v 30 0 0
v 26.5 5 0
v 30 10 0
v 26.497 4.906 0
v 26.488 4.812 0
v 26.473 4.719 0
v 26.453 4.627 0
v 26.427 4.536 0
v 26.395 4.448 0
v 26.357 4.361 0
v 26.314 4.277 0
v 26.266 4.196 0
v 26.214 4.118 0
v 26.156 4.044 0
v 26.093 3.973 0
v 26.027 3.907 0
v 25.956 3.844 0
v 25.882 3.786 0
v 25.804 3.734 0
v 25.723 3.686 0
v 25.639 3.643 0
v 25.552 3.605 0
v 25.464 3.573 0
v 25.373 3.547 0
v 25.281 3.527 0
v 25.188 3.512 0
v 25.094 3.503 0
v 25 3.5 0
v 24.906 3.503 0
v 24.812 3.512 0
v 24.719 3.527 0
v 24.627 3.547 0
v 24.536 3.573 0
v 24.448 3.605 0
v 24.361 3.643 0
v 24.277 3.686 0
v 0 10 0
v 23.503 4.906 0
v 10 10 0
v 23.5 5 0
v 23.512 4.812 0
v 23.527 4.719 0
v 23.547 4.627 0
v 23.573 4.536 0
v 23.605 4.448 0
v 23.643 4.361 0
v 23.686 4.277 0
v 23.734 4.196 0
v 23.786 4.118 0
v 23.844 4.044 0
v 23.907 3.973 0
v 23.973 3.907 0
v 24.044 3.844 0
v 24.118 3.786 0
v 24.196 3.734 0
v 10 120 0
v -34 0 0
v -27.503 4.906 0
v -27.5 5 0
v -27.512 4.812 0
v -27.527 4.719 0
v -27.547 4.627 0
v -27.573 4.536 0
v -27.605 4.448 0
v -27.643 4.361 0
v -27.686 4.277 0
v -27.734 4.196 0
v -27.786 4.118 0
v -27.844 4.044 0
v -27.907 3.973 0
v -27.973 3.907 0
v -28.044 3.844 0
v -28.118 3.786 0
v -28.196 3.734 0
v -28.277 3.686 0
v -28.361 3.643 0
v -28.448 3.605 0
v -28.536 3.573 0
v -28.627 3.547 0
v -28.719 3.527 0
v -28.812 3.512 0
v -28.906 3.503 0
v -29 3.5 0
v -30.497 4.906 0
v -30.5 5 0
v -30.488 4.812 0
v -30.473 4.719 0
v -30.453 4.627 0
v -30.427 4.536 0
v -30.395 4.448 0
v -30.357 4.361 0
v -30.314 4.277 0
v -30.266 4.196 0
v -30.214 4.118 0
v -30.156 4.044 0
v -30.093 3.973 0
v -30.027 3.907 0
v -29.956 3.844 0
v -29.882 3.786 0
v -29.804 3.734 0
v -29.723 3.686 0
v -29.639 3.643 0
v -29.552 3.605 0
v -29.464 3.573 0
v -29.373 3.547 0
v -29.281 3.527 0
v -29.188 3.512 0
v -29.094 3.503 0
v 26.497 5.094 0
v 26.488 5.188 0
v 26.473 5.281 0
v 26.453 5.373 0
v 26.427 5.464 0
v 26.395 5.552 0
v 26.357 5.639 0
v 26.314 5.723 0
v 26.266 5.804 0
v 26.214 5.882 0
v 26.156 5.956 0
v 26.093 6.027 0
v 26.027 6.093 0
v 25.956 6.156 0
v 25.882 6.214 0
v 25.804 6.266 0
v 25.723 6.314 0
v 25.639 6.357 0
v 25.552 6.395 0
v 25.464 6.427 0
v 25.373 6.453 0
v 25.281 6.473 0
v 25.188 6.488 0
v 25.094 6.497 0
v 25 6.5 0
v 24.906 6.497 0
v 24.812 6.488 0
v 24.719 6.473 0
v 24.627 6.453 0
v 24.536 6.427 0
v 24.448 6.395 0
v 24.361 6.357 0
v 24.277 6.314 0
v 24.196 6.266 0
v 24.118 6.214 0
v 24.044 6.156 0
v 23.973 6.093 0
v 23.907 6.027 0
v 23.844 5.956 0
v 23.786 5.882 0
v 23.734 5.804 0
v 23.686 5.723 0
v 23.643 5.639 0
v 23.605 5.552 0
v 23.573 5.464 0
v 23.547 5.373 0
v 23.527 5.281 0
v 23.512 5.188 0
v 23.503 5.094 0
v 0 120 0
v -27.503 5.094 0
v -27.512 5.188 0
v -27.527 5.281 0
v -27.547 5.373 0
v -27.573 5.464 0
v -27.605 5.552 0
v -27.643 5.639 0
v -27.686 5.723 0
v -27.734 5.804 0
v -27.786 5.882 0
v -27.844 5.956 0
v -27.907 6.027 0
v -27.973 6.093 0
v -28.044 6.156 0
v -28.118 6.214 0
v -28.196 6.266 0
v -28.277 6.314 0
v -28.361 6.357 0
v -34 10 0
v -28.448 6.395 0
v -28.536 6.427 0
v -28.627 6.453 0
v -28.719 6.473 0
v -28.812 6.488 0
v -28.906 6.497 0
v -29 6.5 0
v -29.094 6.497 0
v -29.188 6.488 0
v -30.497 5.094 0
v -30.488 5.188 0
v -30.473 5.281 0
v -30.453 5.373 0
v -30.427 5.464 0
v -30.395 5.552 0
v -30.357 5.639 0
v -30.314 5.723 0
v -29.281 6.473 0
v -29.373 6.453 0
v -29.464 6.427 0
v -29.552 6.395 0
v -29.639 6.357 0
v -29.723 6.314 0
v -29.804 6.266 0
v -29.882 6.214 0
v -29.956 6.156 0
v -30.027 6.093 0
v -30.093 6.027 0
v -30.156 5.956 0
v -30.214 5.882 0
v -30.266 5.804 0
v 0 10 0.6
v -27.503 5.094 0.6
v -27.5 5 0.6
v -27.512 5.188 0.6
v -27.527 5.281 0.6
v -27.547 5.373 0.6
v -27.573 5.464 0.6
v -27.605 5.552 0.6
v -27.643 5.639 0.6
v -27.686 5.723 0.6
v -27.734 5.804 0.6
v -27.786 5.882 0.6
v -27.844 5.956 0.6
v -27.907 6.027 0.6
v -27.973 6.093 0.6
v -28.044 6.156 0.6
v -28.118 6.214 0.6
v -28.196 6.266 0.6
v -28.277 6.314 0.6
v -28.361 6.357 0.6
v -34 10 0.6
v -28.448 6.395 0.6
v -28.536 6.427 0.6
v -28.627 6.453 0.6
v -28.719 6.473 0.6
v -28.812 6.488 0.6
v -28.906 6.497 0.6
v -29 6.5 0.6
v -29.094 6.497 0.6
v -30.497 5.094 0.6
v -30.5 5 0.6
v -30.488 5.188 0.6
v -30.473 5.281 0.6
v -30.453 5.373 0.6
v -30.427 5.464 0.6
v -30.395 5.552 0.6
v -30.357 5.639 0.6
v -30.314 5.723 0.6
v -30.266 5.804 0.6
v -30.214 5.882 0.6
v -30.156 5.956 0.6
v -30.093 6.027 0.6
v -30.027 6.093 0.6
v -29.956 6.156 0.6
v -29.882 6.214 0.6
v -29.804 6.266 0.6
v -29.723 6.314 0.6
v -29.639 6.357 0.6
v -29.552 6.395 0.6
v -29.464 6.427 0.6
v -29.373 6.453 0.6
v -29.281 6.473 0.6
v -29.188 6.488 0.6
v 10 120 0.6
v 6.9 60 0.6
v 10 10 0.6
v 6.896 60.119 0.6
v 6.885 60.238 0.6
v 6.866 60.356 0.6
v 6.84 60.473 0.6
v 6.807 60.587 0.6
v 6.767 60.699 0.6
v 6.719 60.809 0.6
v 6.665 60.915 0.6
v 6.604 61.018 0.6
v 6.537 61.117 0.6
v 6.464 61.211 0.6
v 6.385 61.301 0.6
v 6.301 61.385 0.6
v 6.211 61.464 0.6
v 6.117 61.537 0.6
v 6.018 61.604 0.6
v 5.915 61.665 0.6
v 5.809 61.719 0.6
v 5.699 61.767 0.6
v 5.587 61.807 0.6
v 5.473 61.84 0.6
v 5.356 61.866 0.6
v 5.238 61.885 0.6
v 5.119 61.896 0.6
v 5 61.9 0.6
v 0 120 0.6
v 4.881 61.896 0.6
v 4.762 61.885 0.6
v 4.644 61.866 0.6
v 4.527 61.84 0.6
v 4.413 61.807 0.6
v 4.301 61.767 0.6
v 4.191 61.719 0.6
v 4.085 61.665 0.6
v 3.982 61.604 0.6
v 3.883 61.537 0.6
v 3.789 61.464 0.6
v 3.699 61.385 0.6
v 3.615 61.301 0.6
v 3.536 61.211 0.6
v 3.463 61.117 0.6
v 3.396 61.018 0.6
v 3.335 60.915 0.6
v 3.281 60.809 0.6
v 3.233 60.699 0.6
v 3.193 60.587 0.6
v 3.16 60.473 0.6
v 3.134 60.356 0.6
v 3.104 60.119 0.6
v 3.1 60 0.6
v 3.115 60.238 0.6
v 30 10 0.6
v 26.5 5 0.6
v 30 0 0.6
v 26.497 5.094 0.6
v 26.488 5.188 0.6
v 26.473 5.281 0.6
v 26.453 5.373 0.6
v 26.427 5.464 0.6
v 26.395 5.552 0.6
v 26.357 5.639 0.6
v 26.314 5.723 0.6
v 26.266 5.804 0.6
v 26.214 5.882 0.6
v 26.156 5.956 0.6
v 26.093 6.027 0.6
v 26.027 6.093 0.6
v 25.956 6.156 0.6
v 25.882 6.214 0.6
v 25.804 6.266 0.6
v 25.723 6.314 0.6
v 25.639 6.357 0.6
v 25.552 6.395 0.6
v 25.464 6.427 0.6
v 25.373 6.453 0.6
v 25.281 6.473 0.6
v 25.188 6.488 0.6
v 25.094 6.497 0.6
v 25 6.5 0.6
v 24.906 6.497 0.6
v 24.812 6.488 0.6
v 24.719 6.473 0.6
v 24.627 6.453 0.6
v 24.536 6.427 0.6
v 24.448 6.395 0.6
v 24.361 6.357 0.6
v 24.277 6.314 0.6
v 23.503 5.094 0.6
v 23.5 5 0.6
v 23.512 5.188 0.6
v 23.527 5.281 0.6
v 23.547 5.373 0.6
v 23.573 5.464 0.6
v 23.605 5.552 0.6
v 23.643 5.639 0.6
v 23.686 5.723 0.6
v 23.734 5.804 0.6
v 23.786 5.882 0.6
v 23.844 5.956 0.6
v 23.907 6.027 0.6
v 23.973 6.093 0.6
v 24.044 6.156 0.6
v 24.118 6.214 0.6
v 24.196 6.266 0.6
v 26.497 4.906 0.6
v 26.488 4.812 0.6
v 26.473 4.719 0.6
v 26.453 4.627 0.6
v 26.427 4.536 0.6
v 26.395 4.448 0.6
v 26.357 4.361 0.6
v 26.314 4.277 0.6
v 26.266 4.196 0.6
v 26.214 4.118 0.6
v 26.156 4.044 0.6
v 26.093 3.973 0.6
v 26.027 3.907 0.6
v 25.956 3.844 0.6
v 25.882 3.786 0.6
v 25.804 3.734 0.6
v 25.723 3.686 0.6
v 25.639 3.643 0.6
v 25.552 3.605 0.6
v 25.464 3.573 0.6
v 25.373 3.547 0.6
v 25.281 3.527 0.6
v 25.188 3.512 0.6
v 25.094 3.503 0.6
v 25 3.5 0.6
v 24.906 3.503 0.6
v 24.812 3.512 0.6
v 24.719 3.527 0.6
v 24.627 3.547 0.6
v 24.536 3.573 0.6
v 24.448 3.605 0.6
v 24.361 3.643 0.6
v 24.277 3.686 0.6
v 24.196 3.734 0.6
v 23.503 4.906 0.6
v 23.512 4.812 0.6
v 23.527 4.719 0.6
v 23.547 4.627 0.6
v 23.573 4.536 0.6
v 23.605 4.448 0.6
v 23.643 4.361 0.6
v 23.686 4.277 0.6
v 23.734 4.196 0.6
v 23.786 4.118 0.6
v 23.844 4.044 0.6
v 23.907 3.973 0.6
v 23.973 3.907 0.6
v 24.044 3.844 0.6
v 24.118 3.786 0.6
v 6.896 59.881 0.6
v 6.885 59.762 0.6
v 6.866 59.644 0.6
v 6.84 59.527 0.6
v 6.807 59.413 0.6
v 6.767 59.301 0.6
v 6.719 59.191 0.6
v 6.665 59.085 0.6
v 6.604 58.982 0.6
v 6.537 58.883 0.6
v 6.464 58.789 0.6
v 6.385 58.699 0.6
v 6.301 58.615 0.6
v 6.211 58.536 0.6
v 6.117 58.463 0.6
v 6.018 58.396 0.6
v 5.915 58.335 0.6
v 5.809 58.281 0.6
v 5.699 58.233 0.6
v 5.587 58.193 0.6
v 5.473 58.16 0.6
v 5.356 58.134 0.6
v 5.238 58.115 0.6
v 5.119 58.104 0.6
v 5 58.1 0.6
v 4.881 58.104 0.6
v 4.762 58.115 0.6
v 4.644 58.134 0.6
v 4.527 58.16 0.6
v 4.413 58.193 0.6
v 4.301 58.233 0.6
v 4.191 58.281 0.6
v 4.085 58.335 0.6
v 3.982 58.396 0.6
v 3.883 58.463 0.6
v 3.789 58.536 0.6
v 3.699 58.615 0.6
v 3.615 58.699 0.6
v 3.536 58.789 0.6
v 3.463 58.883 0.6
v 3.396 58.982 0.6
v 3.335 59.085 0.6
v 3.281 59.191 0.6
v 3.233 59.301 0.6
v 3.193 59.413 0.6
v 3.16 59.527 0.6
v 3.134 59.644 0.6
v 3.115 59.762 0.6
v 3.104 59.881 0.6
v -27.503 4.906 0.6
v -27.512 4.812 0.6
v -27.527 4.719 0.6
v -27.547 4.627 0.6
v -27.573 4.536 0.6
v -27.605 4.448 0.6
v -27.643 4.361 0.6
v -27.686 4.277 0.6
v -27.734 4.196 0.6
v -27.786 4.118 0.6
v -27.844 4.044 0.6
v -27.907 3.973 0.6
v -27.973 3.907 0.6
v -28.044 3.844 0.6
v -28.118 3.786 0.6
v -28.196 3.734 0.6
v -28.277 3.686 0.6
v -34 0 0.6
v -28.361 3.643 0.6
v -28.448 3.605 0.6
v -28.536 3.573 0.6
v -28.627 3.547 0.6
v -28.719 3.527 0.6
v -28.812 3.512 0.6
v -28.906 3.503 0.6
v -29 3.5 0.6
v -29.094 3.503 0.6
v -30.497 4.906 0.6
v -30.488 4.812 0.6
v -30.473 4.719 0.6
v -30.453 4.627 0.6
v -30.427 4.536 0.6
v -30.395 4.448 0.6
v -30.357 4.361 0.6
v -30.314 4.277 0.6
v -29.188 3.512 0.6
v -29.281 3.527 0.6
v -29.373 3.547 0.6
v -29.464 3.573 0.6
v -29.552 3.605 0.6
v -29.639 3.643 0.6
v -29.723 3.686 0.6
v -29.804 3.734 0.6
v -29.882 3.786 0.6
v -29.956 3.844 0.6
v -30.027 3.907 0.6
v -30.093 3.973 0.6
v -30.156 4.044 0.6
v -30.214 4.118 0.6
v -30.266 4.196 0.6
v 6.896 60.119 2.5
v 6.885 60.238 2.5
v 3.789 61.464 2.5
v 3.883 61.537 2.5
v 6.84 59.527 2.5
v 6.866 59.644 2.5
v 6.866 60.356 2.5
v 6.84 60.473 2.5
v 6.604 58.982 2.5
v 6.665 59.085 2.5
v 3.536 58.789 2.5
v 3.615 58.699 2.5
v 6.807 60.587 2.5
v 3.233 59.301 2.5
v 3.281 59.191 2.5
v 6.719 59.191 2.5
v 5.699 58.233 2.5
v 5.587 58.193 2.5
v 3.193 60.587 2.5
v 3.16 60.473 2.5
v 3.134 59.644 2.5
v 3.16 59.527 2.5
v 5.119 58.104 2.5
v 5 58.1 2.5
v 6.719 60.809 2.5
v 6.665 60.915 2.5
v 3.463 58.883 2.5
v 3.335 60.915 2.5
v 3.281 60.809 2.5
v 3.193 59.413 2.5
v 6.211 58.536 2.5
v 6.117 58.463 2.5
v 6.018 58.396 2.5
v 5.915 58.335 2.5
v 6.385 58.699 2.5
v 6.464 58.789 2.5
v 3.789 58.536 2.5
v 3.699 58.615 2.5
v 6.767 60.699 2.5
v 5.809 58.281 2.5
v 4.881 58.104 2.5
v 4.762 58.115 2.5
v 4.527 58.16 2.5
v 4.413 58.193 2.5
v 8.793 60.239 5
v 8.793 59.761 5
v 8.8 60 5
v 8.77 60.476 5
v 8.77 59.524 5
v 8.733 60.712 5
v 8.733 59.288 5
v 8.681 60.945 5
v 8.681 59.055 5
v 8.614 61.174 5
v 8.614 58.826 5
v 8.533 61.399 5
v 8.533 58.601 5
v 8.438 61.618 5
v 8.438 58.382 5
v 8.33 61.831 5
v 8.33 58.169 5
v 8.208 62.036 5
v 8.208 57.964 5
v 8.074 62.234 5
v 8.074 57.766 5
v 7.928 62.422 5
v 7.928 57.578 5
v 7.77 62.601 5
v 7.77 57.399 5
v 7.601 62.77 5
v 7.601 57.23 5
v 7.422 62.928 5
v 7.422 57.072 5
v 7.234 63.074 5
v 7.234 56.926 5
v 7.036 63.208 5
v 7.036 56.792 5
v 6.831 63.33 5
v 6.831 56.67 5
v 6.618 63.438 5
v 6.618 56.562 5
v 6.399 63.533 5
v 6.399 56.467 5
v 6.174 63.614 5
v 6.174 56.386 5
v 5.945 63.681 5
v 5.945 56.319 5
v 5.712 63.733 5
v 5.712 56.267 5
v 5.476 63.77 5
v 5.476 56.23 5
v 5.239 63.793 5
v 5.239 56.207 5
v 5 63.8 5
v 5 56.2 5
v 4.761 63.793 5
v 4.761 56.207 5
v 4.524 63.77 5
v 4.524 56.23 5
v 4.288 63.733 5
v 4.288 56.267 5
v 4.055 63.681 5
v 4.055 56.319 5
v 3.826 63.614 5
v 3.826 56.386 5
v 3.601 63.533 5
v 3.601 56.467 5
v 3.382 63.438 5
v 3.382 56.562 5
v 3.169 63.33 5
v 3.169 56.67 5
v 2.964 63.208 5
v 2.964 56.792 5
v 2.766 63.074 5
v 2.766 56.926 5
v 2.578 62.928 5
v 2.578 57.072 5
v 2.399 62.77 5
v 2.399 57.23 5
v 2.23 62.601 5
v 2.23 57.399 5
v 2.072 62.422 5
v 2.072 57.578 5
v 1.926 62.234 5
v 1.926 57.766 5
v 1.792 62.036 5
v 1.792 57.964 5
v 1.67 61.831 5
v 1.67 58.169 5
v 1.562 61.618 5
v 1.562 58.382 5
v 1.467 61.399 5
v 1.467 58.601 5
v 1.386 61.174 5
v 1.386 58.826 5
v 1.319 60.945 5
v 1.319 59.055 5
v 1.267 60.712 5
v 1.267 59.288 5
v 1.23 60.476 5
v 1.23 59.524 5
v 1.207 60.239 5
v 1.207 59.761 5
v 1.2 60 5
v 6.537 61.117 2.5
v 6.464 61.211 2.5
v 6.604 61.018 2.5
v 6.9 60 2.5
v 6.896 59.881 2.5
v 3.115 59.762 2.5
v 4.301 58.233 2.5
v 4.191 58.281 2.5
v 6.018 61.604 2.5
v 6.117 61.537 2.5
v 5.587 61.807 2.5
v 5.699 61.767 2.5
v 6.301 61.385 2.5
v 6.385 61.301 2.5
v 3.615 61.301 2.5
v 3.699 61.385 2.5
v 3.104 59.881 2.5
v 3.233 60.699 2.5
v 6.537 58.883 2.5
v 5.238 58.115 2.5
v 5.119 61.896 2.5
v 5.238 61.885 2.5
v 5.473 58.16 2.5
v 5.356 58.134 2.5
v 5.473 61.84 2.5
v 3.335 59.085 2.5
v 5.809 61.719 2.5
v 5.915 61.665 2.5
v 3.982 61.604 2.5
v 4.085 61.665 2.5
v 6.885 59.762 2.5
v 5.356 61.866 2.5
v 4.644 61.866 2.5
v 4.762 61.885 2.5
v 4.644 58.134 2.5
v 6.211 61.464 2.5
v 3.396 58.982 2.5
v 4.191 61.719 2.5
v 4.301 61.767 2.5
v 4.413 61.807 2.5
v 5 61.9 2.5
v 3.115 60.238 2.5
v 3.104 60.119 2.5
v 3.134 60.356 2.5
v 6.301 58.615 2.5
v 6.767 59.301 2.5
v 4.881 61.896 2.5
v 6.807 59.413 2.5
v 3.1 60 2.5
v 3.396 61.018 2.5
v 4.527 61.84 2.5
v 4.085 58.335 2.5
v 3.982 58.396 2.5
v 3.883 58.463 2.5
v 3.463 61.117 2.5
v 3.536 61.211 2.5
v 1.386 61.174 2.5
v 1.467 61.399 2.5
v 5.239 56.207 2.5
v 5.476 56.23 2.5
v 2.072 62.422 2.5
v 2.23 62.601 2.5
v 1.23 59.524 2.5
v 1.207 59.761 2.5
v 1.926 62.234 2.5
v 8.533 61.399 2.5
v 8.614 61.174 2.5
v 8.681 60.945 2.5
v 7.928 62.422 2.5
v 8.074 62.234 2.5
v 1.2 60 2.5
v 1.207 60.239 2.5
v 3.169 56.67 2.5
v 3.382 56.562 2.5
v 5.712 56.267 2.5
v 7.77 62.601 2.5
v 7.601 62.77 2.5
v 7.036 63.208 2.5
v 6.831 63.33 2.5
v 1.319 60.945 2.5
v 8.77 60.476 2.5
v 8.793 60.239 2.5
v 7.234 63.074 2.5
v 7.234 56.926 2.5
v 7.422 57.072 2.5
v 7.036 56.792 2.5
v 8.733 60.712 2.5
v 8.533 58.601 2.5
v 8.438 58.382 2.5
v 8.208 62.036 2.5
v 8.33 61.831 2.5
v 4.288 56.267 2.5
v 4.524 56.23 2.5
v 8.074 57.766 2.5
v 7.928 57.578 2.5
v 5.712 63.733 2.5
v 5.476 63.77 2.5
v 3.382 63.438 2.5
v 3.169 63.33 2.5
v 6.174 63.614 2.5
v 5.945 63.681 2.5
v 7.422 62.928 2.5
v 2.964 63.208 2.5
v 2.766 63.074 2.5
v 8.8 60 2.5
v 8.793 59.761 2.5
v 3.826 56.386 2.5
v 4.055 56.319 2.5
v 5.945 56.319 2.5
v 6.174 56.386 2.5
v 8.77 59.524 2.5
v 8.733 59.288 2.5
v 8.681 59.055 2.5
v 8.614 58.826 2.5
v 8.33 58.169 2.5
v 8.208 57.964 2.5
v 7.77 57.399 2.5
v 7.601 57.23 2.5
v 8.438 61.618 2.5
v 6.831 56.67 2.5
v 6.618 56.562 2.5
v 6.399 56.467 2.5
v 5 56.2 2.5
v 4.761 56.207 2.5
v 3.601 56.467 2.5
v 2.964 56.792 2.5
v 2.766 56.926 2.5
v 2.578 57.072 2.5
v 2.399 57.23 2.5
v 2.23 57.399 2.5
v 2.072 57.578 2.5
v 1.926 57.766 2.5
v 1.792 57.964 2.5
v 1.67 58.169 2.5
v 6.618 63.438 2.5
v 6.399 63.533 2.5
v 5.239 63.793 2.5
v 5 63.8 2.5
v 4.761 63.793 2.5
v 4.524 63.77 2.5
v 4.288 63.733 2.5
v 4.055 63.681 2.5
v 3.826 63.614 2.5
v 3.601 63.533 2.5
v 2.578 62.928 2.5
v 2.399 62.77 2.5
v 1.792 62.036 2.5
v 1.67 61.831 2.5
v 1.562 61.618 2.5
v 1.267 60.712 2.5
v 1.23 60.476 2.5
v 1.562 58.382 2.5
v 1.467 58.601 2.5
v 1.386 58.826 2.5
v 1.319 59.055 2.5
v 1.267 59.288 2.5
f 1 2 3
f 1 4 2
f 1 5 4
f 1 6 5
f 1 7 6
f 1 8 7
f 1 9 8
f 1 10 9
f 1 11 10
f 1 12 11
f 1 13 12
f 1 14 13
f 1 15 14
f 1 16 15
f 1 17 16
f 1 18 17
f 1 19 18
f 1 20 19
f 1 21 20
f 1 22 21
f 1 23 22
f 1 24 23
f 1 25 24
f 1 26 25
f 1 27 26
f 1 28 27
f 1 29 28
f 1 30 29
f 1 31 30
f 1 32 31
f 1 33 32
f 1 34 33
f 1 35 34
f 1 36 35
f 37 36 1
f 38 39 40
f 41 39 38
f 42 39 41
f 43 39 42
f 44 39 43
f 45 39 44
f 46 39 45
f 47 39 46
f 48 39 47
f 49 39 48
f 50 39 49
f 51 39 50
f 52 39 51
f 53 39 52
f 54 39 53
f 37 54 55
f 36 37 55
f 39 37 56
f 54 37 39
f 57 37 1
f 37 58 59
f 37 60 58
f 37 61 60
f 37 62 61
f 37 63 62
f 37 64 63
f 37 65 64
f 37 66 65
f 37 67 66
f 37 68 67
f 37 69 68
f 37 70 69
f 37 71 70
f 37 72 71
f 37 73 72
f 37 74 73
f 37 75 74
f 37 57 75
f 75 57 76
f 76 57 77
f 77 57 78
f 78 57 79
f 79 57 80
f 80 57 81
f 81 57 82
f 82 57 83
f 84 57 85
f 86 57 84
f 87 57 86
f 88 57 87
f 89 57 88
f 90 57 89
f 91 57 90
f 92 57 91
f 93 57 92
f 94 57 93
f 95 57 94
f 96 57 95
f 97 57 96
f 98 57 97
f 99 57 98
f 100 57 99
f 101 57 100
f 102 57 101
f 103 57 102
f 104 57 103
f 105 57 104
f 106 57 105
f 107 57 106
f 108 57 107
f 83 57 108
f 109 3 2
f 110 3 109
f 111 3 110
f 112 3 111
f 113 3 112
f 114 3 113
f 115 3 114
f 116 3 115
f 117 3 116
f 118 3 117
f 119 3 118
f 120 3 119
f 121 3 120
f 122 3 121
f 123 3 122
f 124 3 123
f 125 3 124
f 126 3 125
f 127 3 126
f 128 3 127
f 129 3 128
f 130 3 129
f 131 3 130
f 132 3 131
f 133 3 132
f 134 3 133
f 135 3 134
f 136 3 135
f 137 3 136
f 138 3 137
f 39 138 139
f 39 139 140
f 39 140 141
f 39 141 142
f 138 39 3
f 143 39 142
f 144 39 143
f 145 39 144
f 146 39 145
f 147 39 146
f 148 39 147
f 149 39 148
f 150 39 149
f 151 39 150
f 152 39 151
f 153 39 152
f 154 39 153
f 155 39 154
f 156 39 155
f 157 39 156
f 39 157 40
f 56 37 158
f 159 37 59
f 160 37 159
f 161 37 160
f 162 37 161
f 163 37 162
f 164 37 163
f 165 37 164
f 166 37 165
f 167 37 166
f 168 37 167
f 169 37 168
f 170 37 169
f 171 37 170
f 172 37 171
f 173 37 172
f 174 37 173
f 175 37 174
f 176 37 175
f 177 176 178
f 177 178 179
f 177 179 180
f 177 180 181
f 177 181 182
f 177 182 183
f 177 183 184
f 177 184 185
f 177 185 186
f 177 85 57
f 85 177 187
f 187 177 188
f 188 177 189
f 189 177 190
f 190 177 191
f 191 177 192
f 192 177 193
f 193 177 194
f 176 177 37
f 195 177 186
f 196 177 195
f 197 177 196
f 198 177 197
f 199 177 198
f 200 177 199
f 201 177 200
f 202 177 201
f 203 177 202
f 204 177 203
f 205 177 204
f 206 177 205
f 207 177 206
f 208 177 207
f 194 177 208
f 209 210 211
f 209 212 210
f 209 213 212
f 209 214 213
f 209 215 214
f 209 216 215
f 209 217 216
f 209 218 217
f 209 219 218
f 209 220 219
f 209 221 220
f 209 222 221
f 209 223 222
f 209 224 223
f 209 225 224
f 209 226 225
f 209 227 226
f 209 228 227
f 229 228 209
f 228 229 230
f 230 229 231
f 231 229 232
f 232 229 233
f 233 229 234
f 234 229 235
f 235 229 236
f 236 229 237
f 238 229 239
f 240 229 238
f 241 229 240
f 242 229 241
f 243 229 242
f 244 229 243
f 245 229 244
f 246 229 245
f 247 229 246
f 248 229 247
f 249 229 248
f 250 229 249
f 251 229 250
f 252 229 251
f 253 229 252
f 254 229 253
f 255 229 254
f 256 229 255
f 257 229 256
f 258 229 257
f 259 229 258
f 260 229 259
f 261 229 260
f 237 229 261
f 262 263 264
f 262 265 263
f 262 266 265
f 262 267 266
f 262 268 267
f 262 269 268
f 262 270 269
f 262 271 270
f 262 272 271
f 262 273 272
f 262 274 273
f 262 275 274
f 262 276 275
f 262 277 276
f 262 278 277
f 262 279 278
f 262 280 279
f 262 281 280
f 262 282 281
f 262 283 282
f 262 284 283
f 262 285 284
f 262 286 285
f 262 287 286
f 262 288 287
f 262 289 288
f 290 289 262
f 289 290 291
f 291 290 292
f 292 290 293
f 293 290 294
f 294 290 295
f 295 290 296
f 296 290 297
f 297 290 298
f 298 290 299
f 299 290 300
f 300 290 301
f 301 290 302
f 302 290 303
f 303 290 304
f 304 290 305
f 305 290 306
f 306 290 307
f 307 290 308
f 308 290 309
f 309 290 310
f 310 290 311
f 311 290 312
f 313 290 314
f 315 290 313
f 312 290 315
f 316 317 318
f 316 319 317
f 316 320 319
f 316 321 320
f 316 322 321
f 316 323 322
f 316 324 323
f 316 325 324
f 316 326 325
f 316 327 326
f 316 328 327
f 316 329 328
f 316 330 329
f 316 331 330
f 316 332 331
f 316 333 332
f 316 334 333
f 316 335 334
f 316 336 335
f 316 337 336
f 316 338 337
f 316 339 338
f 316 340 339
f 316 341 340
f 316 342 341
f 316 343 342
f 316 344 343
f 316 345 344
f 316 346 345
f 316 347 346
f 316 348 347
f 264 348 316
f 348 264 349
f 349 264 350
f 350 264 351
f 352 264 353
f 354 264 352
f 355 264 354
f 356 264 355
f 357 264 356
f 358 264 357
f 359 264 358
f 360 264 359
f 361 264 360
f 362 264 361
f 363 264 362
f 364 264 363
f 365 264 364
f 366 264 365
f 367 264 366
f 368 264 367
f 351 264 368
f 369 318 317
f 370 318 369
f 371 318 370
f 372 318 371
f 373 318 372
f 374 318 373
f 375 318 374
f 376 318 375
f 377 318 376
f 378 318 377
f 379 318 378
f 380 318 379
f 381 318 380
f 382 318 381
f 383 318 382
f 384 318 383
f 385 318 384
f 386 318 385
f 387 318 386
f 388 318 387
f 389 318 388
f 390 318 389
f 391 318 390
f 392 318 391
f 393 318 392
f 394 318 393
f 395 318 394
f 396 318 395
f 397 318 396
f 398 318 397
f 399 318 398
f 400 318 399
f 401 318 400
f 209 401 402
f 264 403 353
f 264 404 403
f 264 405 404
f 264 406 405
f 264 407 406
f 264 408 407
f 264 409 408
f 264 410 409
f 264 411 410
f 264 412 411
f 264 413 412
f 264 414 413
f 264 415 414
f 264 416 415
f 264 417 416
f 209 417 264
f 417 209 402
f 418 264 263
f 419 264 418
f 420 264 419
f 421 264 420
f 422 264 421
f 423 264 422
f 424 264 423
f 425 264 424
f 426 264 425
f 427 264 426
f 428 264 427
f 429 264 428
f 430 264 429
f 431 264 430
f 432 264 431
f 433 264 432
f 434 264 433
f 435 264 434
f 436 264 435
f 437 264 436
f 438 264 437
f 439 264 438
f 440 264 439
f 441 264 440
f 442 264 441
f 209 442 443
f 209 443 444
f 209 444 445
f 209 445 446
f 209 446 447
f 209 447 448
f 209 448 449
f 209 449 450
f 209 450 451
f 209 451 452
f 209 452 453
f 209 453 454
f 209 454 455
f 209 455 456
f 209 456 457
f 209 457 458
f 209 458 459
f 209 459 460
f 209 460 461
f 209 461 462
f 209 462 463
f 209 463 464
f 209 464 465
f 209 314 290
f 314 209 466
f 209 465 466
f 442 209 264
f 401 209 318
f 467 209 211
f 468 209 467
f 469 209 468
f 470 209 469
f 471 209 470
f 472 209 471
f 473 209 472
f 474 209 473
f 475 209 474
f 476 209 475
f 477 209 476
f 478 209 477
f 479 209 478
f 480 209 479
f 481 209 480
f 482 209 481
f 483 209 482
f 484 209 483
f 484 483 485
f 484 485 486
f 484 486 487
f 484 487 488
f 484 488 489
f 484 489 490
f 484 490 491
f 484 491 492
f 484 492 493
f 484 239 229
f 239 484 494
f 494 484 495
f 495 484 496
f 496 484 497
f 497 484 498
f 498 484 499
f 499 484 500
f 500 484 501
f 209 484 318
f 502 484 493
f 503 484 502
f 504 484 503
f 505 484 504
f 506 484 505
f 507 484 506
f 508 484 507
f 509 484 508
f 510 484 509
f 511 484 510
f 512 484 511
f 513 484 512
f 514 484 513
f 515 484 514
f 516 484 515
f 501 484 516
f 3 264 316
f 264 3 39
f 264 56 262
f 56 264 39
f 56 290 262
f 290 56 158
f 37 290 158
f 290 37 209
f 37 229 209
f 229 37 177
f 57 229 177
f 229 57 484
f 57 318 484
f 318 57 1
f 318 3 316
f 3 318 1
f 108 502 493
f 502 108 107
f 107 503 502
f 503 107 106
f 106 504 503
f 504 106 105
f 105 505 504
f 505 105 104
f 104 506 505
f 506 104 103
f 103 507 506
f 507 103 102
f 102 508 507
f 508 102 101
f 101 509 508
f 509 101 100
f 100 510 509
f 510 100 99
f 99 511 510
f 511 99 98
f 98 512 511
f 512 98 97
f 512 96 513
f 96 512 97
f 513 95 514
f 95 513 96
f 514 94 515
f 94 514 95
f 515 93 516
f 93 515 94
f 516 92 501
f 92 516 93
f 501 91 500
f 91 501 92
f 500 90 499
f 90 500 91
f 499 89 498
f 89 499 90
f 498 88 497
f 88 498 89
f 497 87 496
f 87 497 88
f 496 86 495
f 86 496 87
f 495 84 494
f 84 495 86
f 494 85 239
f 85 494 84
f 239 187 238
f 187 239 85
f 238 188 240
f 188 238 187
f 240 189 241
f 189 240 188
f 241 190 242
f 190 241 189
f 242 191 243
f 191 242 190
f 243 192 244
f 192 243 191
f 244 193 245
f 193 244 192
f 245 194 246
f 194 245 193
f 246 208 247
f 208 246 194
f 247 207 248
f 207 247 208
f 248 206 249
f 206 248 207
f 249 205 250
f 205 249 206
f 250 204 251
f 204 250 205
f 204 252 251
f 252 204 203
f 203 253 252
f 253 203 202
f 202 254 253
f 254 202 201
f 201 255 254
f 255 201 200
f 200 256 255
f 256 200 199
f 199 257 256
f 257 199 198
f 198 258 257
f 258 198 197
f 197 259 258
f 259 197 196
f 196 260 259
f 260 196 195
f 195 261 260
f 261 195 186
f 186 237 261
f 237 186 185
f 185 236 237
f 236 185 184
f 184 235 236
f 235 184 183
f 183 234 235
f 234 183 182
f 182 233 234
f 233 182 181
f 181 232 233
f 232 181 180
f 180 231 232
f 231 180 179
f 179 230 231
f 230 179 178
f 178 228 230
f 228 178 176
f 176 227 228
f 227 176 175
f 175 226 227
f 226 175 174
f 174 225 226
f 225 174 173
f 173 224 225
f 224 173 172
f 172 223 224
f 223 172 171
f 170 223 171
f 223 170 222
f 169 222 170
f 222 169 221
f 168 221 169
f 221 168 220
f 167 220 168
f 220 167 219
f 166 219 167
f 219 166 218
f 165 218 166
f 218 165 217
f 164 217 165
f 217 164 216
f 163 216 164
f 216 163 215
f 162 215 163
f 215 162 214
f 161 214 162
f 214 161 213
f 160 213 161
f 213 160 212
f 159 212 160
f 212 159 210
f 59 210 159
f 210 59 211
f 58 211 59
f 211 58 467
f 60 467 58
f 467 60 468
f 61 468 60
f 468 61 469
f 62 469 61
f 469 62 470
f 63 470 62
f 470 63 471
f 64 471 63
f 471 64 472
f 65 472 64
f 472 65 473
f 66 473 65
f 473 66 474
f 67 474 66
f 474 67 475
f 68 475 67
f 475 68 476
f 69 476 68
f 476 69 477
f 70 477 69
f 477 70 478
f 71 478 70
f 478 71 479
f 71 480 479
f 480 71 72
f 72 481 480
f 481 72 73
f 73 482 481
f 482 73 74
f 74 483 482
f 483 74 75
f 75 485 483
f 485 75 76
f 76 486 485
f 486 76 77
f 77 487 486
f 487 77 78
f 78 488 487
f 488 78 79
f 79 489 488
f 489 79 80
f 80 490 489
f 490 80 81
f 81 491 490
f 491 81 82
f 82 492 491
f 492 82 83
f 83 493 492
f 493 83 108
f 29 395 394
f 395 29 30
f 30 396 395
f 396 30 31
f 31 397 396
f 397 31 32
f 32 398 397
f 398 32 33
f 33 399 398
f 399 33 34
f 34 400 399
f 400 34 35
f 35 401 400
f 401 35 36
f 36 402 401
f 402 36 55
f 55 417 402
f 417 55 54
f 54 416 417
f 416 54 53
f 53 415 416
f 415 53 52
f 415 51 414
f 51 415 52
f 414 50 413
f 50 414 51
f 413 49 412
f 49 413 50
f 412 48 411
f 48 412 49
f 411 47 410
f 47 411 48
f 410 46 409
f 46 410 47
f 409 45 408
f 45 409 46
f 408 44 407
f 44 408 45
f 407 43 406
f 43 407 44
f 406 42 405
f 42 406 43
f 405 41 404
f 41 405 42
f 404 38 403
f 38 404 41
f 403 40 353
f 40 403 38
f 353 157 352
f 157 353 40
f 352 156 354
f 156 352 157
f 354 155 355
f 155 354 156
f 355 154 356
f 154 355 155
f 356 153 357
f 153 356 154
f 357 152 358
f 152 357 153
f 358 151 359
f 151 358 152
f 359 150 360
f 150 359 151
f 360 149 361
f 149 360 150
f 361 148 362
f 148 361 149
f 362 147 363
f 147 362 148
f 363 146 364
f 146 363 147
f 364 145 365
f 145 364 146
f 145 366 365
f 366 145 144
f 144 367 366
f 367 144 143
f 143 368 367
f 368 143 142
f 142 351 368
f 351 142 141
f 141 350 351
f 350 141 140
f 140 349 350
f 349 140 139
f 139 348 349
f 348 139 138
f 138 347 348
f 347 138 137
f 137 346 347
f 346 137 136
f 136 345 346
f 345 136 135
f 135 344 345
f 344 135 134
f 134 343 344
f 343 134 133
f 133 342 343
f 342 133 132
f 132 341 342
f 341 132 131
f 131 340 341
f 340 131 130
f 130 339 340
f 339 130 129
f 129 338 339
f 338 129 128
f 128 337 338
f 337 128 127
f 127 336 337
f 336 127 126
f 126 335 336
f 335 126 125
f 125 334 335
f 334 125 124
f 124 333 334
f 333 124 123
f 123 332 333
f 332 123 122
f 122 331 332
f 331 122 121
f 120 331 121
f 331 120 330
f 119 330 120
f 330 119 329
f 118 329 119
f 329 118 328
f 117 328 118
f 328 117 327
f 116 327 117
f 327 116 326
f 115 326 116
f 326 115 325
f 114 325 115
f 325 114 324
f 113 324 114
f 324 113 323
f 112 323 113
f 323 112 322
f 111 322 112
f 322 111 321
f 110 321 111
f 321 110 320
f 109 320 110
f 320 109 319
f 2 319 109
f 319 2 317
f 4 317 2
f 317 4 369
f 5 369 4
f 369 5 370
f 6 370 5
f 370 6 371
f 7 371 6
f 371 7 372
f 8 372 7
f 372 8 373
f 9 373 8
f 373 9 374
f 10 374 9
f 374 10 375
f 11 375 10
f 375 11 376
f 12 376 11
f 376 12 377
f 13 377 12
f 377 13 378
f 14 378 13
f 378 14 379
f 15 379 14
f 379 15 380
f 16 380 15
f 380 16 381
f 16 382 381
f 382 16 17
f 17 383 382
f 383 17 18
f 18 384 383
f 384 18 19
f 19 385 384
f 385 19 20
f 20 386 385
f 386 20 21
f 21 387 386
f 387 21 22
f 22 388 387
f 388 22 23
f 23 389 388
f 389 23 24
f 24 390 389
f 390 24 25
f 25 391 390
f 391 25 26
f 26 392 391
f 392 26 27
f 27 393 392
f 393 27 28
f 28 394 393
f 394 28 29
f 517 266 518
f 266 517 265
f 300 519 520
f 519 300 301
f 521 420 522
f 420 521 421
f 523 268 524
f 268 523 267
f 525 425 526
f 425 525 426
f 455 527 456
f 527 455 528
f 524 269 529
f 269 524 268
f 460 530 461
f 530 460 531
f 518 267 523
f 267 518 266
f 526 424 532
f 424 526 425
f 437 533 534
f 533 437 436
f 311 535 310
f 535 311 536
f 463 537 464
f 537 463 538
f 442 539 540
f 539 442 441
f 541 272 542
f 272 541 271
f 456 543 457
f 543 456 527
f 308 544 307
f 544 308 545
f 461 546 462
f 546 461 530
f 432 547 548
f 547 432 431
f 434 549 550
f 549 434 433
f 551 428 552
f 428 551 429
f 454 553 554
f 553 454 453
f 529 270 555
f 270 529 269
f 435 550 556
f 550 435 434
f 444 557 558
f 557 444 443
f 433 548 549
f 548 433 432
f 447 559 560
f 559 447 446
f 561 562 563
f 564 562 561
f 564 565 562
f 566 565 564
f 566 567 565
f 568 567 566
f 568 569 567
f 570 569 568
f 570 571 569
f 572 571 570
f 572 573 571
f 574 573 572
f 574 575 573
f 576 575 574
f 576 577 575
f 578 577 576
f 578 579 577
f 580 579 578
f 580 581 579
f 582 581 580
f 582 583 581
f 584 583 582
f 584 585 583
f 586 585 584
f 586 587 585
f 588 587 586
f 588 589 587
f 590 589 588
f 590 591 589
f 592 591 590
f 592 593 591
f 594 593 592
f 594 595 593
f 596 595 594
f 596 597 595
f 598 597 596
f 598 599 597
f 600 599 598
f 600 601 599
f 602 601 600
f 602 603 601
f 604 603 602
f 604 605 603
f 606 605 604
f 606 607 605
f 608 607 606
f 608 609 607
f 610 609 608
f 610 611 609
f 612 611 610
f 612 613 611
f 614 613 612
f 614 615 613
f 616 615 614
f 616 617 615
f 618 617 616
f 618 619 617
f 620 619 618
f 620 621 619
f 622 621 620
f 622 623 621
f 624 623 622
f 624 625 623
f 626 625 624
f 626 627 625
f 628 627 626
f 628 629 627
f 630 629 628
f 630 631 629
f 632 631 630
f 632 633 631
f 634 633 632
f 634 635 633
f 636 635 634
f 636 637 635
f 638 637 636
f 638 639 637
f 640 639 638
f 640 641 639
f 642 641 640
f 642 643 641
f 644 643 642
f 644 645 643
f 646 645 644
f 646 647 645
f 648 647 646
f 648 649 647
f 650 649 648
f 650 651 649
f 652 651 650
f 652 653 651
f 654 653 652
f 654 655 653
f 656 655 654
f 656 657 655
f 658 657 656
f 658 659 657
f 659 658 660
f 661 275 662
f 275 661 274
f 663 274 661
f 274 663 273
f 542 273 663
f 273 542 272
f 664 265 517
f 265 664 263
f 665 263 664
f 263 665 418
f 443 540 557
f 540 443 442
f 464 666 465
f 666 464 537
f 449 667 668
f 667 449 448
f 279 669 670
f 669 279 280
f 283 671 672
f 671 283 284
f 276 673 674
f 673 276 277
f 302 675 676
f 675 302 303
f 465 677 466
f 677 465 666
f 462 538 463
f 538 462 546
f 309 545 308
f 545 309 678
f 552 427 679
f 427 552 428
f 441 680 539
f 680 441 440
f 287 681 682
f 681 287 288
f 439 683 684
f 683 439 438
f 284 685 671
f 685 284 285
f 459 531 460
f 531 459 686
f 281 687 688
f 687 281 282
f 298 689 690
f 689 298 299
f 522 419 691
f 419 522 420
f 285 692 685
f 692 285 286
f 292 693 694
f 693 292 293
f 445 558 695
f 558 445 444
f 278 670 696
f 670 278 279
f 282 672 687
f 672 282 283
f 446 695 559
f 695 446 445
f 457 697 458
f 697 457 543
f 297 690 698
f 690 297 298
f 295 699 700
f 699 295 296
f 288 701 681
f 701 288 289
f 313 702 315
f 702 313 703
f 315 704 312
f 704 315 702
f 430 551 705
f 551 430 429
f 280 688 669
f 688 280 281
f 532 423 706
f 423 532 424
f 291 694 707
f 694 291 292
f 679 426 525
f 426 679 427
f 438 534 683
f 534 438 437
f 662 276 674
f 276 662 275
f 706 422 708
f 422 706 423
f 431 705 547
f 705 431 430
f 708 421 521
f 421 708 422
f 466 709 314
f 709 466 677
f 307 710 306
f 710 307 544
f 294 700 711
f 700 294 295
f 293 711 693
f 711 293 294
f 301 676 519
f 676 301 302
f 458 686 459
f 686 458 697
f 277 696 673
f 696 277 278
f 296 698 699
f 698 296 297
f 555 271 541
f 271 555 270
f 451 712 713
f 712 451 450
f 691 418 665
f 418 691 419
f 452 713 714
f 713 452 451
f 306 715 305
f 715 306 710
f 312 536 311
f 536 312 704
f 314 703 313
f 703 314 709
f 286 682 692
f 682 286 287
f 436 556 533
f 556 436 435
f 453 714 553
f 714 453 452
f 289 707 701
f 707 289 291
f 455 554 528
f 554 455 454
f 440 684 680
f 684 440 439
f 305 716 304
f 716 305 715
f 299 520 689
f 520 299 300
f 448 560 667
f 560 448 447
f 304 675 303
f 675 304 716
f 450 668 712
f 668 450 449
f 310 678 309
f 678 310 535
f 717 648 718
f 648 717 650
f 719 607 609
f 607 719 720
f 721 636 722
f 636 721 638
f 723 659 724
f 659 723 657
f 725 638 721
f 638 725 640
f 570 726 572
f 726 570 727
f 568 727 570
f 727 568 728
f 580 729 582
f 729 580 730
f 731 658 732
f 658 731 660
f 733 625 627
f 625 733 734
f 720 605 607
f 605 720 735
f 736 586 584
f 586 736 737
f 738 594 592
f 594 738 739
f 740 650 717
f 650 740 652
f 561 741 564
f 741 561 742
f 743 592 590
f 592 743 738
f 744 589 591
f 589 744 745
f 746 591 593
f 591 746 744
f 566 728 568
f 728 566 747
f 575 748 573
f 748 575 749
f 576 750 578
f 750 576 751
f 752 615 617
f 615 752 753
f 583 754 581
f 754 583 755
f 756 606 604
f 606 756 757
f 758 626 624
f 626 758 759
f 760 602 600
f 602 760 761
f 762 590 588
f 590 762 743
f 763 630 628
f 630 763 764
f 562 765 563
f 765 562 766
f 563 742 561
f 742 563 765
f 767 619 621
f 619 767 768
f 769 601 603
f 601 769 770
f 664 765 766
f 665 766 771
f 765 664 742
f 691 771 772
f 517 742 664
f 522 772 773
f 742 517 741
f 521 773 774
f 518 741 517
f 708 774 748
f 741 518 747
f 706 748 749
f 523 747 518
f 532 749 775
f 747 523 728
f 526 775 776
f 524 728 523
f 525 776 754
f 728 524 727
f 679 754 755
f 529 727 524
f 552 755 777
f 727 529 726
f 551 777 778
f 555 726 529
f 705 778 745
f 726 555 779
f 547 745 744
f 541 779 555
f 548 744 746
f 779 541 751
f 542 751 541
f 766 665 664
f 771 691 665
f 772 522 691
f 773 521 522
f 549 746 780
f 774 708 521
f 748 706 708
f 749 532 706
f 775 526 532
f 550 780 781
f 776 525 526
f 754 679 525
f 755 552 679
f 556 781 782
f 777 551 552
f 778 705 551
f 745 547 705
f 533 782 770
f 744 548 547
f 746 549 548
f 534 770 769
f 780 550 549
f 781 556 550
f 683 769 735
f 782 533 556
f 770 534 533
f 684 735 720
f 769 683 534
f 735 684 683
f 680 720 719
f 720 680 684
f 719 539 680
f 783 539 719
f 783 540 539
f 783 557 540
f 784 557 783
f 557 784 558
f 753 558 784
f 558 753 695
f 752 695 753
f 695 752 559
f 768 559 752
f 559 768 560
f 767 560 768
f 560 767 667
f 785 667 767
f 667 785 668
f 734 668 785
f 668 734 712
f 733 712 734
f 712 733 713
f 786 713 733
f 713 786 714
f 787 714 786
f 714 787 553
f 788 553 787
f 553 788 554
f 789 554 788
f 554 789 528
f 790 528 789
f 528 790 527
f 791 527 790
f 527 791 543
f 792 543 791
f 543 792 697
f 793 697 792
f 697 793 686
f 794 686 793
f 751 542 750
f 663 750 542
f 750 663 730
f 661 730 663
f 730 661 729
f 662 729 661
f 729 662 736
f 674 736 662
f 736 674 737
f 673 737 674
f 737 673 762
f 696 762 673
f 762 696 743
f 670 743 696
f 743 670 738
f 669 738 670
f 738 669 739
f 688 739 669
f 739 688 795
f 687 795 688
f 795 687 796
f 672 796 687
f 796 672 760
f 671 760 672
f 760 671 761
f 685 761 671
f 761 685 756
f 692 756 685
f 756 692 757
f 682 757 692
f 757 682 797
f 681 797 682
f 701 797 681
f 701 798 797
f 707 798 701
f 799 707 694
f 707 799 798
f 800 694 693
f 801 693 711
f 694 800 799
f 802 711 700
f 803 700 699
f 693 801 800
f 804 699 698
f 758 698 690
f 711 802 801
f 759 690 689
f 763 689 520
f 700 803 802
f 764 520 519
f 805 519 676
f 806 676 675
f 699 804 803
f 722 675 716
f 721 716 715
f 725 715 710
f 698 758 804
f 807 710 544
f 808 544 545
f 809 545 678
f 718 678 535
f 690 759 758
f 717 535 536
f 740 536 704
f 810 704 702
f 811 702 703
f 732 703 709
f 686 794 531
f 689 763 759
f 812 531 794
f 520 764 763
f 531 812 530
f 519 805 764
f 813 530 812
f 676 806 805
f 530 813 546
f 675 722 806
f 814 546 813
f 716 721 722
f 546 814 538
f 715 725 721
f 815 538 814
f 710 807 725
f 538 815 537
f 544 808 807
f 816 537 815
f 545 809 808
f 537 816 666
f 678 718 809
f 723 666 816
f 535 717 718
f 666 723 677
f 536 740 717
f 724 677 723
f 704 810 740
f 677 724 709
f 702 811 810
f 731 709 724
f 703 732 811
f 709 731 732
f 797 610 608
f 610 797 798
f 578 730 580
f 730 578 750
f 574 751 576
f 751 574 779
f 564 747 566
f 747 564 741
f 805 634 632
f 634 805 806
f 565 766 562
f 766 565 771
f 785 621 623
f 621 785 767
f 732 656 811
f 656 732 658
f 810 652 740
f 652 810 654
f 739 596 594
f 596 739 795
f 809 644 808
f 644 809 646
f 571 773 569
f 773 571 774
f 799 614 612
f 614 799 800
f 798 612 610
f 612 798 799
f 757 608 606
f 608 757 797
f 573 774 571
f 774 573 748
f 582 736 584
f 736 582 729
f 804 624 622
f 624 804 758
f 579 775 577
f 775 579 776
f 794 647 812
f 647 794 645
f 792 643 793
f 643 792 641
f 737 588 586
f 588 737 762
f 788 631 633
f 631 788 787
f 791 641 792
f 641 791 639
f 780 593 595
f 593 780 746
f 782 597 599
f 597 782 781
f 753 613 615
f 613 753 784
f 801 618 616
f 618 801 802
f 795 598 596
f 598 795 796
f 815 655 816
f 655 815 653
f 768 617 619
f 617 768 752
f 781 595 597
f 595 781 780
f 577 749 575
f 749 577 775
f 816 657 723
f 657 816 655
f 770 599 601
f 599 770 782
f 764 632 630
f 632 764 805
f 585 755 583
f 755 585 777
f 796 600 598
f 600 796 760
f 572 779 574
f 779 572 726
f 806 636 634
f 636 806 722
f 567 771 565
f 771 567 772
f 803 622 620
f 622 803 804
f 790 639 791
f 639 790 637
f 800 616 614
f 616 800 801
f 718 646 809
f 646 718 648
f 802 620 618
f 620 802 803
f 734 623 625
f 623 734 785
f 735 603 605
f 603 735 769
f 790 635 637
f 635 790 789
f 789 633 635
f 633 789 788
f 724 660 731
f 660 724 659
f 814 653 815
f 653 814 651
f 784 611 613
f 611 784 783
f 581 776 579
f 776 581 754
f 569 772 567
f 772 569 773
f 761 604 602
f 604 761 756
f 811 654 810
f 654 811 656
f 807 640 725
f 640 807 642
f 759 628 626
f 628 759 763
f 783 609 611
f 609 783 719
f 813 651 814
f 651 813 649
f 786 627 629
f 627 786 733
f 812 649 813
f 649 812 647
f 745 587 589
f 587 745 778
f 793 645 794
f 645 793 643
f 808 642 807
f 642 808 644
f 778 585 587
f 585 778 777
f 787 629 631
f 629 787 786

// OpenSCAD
$fn = 100;

linear_extrude(height = 0.6) {
  difference() {
    union() {
      square([10, 120]);
      translate([-34, 0, 0]) square([64, 10]);
    }
    translate([-29, 5, 0]) circle(1.5);
    translate([25, 5, 0]) circle(1.5);
  }
}
translate([5, 60, 0]) cylinder(h = 5, r = 1.9);
translate([5, 60, 2.5]) cylinder(h = 2.5, r = 3.8);
